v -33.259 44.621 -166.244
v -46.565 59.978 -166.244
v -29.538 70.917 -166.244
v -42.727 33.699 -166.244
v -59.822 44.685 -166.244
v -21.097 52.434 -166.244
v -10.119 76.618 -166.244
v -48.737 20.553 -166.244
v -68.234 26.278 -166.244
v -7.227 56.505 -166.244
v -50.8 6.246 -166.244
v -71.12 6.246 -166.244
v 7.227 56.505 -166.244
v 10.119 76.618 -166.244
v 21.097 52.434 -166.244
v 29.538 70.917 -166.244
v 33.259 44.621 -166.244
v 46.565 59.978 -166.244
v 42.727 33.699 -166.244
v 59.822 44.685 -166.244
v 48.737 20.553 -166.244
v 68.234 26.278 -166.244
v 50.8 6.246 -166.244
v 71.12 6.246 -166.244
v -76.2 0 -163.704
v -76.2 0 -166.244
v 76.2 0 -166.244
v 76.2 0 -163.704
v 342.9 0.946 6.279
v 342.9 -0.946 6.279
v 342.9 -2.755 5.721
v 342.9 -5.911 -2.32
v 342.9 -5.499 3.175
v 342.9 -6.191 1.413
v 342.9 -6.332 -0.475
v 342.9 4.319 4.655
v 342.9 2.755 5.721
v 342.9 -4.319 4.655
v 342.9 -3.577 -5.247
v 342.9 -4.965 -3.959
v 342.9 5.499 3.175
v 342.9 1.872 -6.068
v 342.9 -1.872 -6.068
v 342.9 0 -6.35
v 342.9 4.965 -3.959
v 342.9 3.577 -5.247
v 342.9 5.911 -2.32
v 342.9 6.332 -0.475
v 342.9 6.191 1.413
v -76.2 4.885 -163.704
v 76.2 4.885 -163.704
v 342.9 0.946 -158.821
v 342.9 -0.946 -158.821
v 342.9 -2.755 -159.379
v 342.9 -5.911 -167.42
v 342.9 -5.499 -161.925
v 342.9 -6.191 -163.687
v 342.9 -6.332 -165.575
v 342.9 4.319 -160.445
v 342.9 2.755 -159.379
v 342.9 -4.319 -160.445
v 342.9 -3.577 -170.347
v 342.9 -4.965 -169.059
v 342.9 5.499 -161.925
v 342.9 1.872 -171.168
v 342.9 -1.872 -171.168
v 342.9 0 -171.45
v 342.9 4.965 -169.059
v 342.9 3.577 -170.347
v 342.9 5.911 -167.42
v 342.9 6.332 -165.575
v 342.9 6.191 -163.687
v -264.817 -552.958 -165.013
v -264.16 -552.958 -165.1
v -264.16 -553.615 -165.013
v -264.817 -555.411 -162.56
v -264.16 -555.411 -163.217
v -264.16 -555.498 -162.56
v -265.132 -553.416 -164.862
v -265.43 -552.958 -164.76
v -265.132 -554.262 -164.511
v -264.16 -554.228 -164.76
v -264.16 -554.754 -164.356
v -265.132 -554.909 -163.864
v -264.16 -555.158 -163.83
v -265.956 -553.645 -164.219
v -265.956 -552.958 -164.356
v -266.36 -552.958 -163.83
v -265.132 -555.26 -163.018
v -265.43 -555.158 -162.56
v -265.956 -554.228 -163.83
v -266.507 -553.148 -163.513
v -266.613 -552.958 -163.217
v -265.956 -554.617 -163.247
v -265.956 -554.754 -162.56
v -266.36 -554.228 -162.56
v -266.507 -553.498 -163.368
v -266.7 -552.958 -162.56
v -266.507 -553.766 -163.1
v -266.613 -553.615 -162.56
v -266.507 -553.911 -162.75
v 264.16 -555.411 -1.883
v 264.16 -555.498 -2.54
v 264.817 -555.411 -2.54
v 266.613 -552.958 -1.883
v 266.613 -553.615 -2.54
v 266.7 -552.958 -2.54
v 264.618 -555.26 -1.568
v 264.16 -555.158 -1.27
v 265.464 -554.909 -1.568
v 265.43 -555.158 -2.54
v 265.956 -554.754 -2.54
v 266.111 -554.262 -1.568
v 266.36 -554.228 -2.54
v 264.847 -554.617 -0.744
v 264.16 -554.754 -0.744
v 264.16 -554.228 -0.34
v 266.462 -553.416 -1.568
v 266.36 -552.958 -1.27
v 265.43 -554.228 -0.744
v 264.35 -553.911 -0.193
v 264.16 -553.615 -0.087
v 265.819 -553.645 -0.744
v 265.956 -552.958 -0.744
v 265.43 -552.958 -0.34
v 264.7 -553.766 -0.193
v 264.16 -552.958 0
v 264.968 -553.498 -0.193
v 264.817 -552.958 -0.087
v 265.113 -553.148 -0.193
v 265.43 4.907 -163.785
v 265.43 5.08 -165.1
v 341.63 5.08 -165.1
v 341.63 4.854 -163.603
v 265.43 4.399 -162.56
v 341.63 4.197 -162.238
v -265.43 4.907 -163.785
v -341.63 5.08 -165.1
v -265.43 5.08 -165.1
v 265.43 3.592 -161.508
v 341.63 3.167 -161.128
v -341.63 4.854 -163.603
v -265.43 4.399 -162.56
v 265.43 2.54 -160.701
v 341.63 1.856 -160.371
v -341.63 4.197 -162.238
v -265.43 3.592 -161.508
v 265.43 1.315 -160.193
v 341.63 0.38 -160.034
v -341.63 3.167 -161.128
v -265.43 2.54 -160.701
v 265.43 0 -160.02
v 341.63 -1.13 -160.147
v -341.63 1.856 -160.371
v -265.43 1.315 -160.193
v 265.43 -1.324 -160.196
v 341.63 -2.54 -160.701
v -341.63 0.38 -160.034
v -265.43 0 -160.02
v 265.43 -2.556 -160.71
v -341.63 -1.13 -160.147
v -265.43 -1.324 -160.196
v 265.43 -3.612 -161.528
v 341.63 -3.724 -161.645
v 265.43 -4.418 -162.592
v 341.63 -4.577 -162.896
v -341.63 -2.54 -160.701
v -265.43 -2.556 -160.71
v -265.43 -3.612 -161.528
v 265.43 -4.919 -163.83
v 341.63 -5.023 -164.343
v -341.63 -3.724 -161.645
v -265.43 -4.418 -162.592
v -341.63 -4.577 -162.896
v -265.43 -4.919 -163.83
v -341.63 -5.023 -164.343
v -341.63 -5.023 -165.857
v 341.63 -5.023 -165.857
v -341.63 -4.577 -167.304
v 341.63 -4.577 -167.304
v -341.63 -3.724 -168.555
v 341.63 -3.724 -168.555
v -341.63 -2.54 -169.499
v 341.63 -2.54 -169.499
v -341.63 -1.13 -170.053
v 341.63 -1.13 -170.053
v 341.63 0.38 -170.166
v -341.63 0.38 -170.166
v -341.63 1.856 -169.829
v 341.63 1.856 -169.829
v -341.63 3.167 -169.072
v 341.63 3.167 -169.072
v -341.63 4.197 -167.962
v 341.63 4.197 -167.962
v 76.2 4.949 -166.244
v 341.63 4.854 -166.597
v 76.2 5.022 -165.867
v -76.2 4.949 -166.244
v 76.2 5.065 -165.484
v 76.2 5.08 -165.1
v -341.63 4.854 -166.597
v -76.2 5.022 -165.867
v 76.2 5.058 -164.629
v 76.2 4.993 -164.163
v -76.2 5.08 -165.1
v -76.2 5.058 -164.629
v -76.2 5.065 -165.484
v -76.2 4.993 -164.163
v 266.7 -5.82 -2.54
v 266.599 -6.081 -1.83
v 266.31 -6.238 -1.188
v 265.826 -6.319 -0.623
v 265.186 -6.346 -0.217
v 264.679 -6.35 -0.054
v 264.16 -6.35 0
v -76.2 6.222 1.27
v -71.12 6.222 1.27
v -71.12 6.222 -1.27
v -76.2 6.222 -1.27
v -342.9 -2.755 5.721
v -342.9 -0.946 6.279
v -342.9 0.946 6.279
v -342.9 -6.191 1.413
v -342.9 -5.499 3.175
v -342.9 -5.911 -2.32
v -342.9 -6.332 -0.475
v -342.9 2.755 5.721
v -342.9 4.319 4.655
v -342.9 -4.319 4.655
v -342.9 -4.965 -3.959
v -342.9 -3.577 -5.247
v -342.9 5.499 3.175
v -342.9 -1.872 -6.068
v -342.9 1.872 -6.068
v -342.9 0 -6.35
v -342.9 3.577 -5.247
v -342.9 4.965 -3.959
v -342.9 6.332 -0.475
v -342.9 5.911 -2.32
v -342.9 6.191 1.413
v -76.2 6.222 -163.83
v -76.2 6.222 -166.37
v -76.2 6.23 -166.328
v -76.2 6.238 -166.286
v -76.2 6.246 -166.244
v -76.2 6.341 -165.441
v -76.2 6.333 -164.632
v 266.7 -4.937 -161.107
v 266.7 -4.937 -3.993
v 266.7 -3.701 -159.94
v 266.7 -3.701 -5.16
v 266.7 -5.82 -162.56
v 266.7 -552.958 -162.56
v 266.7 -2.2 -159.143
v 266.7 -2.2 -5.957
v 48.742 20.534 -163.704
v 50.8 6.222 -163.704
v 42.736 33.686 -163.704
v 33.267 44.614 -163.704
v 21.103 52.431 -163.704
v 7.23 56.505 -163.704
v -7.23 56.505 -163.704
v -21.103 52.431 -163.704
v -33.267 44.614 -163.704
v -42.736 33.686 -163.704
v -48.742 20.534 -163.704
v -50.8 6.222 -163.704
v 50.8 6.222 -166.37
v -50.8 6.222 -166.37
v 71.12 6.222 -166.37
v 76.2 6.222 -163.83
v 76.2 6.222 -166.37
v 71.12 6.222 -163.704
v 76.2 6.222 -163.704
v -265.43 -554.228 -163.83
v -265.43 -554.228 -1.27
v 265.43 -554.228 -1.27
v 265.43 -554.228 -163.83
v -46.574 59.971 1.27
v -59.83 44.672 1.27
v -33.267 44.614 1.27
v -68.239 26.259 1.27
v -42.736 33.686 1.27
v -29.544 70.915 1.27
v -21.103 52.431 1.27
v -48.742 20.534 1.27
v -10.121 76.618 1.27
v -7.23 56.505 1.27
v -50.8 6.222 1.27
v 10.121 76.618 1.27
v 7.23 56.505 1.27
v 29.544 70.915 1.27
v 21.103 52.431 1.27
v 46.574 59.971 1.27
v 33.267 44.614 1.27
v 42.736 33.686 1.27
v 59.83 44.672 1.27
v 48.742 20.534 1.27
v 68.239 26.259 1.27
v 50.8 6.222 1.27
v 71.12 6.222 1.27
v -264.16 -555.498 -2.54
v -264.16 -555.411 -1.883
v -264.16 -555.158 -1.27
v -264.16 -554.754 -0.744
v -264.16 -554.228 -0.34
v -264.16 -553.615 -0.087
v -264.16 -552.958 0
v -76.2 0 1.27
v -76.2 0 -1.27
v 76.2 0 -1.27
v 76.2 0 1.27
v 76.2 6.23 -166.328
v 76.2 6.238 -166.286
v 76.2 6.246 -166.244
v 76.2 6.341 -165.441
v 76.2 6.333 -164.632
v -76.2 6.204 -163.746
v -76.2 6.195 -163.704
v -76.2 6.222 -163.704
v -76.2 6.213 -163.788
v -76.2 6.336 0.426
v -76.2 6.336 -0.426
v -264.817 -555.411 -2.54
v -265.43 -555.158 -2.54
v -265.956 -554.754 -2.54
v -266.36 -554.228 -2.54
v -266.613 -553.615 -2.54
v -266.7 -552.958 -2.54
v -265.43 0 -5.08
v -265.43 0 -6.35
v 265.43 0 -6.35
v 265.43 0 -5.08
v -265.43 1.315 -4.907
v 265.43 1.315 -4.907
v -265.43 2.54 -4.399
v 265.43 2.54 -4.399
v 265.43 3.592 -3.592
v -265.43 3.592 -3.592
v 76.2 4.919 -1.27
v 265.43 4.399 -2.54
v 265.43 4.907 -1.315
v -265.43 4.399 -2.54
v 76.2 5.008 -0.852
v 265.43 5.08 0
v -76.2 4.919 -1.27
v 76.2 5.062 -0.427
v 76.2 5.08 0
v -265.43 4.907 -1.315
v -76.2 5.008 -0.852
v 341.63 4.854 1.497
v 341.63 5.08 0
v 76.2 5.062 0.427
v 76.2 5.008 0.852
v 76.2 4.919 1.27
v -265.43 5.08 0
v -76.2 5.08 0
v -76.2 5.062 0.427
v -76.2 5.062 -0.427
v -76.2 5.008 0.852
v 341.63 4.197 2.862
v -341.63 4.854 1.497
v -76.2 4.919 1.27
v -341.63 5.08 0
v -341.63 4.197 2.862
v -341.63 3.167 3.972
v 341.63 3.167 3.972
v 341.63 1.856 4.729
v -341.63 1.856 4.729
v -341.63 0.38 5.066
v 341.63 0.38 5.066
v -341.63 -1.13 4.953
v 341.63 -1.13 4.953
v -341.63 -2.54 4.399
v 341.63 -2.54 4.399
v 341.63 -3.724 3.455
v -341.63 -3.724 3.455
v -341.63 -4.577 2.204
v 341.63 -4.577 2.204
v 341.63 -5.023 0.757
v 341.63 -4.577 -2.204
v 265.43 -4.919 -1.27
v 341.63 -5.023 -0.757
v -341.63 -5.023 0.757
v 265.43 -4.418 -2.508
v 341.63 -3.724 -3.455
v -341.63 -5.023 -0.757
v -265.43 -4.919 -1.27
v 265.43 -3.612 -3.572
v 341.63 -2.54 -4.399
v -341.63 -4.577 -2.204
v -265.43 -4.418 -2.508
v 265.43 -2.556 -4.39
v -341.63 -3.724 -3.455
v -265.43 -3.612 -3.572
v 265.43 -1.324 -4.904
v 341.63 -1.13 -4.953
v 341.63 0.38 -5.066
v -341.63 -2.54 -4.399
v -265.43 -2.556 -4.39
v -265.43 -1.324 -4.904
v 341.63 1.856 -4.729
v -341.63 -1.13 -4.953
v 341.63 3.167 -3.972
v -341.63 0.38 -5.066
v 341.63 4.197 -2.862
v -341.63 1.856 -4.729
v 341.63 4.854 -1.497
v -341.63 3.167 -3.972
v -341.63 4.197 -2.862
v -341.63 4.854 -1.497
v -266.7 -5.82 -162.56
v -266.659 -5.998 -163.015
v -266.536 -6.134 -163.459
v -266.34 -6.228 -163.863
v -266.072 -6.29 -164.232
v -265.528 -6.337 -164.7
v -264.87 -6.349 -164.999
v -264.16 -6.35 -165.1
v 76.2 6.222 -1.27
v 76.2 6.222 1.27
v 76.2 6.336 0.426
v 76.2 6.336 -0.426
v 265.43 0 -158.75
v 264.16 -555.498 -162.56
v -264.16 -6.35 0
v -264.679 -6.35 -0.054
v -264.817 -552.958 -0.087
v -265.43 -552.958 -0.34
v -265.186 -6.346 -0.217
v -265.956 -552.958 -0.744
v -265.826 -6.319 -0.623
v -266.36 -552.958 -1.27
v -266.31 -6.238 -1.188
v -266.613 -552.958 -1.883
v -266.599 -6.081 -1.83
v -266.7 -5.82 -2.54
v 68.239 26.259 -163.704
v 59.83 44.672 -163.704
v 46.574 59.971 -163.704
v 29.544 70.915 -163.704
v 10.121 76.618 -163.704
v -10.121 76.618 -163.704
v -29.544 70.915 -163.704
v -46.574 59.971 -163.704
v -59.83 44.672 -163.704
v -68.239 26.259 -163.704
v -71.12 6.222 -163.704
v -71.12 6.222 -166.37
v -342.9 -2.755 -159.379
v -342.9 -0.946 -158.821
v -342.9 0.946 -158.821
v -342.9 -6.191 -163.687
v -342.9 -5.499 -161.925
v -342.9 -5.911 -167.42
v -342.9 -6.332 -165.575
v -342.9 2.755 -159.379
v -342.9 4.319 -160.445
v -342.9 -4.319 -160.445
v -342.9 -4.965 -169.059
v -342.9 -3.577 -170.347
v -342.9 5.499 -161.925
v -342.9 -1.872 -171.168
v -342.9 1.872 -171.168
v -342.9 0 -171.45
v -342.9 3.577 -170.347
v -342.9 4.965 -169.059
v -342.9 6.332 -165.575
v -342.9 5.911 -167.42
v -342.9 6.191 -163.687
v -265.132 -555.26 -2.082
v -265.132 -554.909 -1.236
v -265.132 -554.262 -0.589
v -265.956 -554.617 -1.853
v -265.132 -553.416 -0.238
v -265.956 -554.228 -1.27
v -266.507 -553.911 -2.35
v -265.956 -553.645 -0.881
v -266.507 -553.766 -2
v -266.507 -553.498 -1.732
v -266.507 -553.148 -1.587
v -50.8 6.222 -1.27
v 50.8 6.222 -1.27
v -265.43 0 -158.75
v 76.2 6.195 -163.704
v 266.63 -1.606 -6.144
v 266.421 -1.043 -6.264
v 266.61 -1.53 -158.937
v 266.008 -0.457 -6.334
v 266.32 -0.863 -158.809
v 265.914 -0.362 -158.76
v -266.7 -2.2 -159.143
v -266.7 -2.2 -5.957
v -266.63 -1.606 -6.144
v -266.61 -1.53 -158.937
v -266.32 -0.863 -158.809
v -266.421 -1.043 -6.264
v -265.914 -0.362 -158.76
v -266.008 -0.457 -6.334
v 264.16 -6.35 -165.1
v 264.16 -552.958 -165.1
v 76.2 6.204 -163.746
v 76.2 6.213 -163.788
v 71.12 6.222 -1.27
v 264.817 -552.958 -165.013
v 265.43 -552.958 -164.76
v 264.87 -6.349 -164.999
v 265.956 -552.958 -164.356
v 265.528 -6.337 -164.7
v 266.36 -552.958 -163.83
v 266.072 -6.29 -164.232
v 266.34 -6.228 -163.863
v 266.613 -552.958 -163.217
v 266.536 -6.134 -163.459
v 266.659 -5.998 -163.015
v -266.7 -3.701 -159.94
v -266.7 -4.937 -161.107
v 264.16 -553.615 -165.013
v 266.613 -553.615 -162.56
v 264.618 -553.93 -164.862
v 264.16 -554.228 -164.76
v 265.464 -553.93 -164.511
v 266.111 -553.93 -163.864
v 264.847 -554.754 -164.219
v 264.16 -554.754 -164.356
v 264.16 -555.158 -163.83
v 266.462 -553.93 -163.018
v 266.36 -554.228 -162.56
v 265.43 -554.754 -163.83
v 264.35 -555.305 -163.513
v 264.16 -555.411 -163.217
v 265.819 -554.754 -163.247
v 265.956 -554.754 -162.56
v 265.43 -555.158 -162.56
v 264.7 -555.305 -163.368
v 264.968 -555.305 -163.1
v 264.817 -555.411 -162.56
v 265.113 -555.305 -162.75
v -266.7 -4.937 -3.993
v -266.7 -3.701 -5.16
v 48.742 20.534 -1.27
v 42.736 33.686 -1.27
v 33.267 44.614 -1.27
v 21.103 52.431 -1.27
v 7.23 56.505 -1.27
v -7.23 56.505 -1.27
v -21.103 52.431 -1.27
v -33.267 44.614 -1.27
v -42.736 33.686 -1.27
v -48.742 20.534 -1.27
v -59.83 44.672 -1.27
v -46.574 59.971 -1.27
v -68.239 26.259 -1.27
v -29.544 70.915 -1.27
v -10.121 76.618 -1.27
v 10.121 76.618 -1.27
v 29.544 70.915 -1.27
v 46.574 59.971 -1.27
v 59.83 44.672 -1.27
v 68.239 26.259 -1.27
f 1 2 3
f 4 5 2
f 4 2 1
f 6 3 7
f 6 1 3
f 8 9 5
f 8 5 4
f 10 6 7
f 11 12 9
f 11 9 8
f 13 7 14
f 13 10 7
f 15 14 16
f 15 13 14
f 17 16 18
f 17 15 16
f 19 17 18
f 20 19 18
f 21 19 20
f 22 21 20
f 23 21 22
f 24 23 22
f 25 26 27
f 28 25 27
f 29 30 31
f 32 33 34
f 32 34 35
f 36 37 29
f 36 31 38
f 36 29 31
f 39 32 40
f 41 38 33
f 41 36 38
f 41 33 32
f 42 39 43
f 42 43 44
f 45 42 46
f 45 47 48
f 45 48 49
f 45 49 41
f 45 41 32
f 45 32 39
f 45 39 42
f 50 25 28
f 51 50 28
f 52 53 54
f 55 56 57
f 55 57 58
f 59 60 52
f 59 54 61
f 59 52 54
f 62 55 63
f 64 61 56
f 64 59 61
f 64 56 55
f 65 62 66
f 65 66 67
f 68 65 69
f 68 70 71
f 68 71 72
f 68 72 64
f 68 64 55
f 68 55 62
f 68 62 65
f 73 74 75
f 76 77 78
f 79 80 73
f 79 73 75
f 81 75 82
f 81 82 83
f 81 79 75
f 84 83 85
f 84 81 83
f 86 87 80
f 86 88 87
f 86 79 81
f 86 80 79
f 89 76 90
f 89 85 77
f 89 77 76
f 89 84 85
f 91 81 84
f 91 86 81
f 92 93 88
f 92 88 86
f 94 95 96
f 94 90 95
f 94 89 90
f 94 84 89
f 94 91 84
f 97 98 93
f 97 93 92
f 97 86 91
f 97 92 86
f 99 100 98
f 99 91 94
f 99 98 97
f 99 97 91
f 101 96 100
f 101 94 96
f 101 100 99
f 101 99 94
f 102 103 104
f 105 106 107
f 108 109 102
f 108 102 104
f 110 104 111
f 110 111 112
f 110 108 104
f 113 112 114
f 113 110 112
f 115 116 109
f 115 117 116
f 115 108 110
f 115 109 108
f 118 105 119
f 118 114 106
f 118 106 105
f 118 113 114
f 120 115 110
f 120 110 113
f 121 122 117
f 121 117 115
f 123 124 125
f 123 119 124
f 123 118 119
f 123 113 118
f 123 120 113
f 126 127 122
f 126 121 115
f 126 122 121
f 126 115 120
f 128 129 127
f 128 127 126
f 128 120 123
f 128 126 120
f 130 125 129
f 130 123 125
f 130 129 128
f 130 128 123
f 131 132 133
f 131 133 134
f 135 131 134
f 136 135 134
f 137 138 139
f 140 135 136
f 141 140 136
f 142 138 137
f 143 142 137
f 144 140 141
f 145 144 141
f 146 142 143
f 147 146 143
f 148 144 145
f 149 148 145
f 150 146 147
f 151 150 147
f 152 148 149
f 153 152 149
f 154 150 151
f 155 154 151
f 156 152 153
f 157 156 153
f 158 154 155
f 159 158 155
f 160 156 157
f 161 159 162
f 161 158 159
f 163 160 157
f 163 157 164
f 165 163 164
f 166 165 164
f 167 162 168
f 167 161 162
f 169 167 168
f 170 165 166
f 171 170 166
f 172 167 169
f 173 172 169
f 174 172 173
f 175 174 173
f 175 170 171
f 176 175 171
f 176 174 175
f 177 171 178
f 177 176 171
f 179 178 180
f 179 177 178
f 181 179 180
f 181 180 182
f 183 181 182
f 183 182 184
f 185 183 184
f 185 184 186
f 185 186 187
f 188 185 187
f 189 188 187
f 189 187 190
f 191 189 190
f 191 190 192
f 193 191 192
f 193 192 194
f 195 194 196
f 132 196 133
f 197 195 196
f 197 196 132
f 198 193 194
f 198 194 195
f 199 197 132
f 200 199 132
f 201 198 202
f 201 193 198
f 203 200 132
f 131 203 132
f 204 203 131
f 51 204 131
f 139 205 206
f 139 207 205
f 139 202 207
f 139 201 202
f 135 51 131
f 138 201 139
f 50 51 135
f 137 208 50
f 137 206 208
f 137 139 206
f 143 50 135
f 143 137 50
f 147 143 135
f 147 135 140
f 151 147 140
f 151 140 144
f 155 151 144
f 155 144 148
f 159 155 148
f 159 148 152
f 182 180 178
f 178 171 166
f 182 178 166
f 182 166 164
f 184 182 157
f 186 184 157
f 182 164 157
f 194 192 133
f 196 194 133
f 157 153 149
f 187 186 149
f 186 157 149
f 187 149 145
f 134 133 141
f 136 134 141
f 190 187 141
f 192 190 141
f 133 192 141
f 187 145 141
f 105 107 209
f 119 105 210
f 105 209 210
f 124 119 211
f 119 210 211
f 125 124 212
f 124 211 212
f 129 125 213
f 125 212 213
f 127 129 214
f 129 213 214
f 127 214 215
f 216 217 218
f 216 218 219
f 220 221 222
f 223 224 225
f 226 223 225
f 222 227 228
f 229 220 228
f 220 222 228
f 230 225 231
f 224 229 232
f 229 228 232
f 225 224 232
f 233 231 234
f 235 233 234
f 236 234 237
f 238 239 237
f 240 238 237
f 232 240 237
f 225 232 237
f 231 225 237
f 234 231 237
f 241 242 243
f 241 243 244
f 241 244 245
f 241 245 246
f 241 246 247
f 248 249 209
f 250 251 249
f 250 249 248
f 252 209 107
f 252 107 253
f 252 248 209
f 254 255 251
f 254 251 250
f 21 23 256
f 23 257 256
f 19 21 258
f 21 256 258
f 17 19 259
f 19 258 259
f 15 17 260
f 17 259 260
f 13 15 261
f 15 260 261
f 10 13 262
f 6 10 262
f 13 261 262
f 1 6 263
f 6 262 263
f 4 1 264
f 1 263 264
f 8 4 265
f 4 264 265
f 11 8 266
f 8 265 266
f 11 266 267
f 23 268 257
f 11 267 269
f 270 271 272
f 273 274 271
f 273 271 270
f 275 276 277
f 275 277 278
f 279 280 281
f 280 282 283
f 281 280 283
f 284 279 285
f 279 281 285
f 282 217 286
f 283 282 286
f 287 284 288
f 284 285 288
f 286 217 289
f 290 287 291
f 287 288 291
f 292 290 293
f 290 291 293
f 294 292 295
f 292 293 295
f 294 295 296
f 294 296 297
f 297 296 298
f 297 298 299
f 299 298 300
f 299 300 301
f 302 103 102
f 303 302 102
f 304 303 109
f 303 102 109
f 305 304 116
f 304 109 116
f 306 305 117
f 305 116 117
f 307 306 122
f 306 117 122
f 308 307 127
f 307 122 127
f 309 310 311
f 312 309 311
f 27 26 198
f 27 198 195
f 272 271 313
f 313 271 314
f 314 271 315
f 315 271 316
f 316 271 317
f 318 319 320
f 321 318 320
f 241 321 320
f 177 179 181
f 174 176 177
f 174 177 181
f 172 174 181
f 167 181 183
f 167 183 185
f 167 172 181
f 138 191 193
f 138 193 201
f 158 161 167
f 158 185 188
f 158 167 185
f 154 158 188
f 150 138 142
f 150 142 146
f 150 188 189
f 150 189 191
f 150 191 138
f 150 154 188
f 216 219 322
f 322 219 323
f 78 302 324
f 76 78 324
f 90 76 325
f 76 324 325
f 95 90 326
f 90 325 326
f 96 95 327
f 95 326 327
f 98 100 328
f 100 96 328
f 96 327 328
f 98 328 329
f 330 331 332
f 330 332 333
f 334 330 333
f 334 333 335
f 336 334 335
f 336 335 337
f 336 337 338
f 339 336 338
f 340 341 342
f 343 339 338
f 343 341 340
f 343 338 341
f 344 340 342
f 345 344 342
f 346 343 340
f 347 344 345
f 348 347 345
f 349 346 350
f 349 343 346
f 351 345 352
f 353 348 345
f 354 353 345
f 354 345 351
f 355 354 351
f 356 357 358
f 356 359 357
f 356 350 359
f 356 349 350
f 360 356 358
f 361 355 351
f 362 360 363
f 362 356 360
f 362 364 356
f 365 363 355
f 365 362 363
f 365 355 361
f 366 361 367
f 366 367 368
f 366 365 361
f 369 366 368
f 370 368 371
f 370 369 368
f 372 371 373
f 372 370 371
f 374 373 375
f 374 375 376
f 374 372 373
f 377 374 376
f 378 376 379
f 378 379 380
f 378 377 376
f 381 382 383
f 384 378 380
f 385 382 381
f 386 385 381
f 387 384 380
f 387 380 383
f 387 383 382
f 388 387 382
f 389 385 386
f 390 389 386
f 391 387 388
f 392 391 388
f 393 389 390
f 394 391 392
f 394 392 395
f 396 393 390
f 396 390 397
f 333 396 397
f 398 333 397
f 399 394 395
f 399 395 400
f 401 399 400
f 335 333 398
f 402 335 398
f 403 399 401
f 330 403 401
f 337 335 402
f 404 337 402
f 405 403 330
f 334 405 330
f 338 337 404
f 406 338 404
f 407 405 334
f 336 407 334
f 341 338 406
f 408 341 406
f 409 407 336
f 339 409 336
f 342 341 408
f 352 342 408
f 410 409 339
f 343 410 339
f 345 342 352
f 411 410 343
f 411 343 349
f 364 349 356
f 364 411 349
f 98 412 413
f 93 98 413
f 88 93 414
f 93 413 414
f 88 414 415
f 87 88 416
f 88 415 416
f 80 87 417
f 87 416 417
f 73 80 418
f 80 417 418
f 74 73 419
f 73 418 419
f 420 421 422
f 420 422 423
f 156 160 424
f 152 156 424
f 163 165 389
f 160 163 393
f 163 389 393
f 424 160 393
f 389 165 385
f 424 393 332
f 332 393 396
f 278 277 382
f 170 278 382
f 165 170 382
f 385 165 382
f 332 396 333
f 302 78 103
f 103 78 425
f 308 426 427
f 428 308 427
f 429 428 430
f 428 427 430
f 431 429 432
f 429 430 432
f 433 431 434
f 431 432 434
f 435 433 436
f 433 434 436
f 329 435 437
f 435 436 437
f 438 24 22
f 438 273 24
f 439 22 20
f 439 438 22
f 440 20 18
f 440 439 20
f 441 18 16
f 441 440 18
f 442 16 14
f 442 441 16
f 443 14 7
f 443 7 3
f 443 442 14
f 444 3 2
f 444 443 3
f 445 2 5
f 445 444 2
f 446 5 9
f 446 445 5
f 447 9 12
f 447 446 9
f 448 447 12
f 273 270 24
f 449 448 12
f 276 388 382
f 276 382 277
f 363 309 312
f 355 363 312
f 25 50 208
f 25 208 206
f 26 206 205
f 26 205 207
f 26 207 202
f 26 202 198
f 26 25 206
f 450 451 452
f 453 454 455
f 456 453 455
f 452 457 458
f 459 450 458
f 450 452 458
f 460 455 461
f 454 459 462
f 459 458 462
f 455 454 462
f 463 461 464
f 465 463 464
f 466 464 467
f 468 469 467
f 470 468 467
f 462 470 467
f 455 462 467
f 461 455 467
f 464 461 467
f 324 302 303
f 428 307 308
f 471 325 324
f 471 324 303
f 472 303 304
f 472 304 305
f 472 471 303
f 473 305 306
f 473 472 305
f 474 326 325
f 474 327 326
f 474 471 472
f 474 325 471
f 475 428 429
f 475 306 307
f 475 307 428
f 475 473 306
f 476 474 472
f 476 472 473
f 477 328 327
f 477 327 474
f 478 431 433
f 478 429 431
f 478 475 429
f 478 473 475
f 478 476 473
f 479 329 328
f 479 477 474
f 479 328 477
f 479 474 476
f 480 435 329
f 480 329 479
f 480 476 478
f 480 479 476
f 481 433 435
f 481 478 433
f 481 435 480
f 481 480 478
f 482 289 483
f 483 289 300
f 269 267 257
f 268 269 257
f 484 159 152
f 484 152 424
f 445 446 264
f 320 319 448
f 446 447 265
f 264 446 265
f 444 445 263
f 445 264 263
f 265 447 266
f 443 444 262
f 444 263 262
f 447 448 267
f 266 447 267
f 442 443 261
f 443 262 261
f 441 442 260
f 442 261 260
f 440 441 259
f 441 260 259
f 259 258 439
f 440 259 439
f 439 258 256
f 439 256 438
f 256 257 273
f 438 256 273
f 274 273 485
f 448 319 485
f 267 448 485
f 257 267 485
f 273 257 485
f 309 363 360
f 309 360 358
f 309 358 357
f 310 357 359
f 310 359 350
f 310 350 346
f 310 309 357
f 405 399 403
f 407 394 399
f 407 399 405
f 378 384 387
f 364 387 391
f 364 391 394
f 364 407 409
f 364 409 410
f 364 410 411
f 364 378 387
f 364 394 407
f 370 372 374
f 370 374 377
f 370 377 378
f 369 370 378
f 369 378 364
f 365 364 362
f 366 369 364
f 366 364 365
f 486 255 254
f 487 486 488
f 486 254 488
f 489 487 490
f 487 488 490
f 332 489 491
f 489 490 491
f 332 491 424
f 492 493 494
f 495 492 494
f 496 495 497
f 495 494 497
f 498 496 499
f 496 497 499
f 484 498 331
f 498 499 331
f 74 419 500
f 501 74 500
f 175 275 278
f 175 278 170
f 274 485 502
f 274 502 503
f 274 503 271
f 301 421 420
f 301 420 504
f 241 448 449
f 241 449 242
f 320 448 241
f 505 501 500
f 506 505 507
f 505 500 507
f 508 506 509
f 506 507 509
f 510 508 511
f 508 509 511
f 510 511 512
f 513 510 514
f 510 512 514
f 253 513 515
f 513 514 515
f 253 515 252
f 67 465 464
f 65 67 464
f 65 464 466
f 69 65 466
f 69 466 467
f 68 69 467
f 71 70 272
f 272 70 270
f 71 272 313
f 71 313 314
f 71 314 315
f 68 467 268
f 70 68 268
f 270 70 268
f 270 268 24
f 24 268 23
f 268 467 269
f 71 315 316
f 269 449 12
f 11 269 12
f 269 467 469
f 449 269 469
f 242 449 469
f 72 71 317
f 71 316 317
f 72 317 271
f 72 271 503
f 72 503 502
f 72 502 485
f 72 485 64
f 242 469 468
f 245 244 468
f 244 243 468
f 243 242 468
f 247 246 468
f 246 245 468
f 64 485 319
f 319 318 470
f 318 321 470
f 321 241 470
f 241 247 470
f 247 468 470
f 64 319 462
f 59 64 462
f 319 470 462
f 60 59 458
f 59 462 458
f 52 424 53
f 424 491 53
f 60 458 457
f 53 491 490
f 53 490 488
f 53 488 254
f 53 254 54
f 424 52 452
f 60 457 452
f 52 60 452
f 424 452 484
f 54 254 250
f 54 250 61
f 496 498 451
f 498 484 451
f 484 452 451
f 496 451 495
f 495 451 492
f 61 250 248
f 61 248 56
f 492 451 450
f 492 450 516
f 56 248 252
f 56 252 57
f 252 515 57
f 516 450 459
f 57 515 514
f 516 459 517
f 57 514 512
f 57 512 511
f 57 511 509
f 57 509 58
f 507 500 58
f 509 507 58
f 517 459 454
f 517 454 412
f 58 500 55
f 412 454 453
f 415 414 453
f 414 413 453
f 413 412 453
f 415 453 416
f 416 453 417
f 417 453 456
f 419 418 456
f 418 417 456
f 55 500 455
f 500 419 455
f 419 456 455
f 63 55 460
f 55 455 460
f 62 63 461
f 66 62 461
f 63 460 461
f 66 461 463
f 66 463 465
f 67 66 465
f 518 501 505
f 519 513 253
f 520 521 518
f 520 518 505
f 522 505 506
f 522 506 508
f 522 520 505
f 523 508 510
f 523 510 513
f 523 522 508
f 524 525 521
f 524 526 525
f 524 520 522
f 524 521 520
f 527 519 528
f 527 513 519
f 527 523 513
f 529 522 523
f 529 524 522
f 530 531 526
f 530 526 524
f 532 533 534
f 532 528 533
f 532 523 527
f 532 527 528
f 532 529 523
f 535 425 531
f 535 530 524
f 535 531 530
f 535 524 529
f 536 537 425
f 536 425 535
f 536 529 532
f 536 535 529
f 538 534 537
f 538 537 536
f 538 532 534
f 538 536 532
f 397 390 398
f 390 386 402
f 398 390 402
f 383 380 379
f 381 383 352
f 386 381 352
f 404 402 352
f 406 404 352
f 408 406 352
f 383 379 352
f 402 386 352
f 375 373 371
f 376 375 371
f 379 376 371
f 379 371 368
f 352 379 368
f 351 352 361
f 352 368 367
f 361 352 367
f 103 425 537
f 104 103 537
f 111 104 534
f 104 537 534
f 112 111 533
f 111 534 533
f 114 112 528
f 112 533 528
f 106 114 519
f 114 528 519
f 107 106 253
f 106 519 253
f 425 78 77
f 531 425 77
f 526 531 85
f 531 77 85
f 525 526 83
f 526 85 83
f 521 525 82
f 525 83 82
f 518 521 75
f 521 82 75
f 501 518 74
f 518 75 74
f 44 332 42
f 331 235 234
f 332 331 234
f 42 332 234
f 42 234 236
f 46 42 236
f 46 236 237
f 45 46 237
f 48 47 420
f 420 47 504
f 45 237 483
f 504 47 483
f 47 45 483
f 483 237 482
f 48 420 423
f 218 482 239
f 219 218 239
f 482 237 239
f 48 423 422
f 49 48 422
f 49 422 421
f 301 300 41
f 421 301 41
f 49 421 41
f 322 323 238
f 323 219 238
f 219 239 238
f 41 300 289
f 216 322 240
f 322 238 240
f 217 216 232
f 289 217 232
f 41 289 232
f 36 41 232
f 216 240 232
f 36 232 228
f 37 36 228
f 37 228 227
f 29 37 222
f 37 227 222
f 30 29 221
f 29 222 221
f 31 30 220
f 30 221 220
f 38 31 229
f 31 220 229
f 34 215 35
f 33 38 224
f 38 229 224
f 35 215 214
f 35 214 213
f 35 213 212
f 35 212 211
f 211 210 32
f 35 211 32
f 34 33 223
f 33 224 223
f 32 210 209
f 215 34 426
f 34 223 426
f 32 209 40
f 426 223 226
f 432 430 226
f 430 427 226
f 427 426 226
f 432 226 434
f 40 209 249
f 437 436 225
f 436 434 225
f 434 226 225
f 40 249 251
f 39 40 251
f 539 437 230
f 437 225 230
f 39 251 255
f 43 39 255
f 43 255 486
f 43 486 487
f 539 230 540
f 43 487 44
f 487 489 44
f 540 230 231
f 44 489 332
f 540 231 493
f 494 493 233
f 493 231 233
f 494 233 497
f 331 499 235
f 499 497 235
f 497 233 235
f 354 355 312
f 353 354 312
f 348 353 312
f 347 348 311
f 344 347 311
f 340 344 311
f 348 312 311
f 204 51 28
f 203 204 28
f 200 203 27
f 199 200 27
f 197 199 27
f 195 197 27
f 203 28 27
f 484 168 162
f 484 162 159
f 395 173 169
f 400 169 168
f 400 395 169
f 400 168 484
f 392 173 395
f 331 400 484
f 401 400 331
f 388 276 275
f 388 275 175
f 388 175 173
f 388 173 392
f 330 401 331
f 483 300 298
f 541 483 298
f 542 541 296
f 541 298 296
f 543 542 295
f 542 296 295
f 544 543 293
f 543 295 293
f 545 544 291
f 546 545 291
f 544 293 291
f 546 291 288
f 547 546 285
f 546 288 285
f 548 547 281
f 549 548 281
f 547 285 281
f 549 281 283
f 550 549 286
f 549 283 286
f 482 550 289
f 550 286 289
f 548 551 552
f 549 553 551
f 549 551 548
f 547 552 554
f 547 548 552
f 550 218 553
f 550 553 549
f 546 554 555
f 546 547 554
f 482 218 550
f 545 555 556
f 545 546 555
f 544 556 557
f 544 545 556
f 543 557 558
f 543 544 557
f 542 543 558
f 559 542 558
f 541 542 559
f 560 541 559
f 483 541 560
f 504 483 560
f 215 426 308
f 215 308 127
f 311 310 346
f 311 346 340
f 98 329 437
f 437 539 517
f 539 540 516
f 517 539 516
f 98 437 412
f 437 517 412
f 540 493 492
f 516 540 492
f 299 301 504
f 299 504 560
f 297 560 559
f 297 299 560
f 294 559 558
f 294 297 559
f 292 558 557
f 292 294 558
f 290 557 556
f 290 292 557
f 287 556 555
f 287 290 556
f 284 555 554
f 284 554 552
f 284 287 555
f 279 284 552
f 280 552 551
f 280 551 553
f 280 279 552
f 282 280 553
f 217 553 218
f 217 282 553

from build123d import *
from build123d.topology import SkipClean

# Parameters (mm, degrees)
SALIENTE_EXTRUIR3_DEPTH        = 342.9
SALIENTE_EXTRUIR3_DEPTH_BACK   = 342.9
CROQUIS3_R                     = 6.35
SALIENTE_EXTRUIR3_2_DEPTH      = 342.9
SALIENTE_EXTRUIR3_2_DEPTH_BACK = 342.9
CROQUIS4_W                     = 533.4
CROQUIS4_H                     = 165.1
SALIENTE_EXTRUIR4_DEPTH        = 555.498
VACIADO3_START                 = -265.43
VACIADO3_DEPTH                 = 530.86
VACIADO3_START_2               = -341.63
VACIADO3_2_OUTLINE_R           = 5.08
VACIADO3_2_DEPTH               = 683.26
REDONDEO5_R                    = 2.54
CROQUIS5_W                     = 152.4
CROQUIS5_H                     = 2.54
SALIENTE_EXTRUIR5_DEPTH        = 101.6
CORTAR_EXTRUIR2_DEPTH          = 676.270787465
CORTAR_EXTRUIR8_DEPTH          = 676.270787542


# Read off the part's stored shape, not the designer's step: Vaciado3
with BuildPart() as part:
    # Croquis3 → Saliente-Extruir3 (new, two sides: drawn at the far end of the back side and taken through both)
    with BuildSketch(Plane(origin=(0, 0, 0), x_dir=(0, 0, -1), z_dir=(1, 0, 0)).offset(-SALIENTE_EXTRUIR3_DEPTH_BACK)):
        Circle(CROQUIS3_R)
    extrude(amount=SALIENTE_EXTRUIR3_DEPTH + SALIENTE_EXTRUIR3_DEPTH_BACK)



with BuildPart() as body_2:
    # Croquis3 → Saliente-Extruir3 2 (new, two sides: drawn at the far end of the back side and taken through both)
    with BuildSketch(Plane(origin=(0, 0, 0), x_dir=(0, 0, -1), z_dir=(1, 0, 0)).offset(-SALIENTE_EXTRUIR3_2_DEPTH_BACK)):
        with Locations((165.1, 0)):
            Circle(CROQUIS3_R)
    extrude(amount=SALIENTE_EXTRUIR3_2_DEPTH + SALIENTE_EXTRUIR3_2_DEPTH_BACK)


with BuildPart() as part_1:
    add(part.part)

    add(body_2.part)  # Saliente-Extruir4 merges body 2
    # Croquis4 → Saliente-Extruir4 (add)
    with BuildSketch(Plane(origin=(0, 0, 0), x_dir=(1, 0, 0), z_dir=(0, 1, 0))):
        with Locations((0, 82.55)):
            Rectangle(CROQUIS4_W, CROQUIS4_H)
    extrude(amount=-SALIENTE_EXTRUIR4_DEPTH)

    # Vaciado3 outline → Vaciado3 (cut)
    with BuildSketch(Plane.YZ.offset(VACIADO3_START)):
        with BuildLine():
            Line((-554.228, -163.83), (-4.91868885, -163.83))
            ThreePointArc((-4.91868885, -163.83), (3.110851973, -169.116092628), (0, -160.02))
            Line((0, -160.02), (0, -5.08))
            ThreePointArc((0, -5.08), (3.110851973, 4.016092628), (-4.91868885, -1.27))
            Line((-4.91868885, -1.27), (-554.228, -1.27))
            Line((-554.228, -1.27), (-554.228, -163.83))
        make_face()
    extrude(amount=VACIADO3_DEPTH, mode=Mode.SUBTRACT)

    # Vaciado3 2 outline → Vaciado3 2 (cut)
    with BuildSketch(Plane.YZ.offset(VACIADO3_START_2)):
        with Locations((0, -165.1)):
            Circle(VACIADO3_2_OUTLINE_R)
        Circle(VACIADO3_2_OUTLINE_R)
    extrude(amount=VACIADO3_2_DEPTH, mode=Mode.SUBTRACT)

    # Redondeo5
    # the kernel refuses this fillet: 2.54 mm, written as the material it takes off along each edge
    with BuildSketch(Plane(origin=(-264.16, -552.958, -2.54), x_dir=(0, 0, 1), z_dir=(-1, 0, 0))) as redondeo5_piece_1_section:
        Polygon((0, 0), (REDONDEO5_R * 1.02, 0), (REDONDEO5_R * 1.02, -REDONDEO5_R * 1.02), (0, -REDONDEO5_R * 1.02), align=None)
    redondeo5_piece_1 = extrude(amount=REDONDEO5_R * 1.02, mode=Mode.PRIVATE)
    redondeo5_piece_1 = redondeo5_piece_1 - Plane(origin=(-264.16, -552.958, -2.54), x_dir=(0, 0.7071067811865475, -0.7071067811865475), z_dir=(-1, 0, 0)) * Sphere(REDONDEO5_R, mode=Mode.PRIVATE)
    add(redondeo5_piece_1, mode=Mode.SUBTRACT)
    with BuildSketch(Plane(origin=(-264.16, -552.958, -162.56), x_dir=(0, -1, 0), z_dir=(-1, 0, 0))) as redondeo5_piece_2_section:
        Polygon((0, 0), (REDONDEO5_R * 1.02, 0), (REDONDEO5_R * 1.02, -REDONDEO5_R * 1.02), (0, -REDONDEO5_R * 1.02), align=None)
    redondeo5_piece_2 = extrude(amount=REDONDEO5_R * 1.02, mode=Mode.PRIVATE)
    redondeo5_piece_2 = redondeo5_piece_2 - Plane(origin=(-264.16, -552.958, -162.56), x_dir=(0, 0.7071067811865475, 0.7071067811865475), z_dir=(-1, 0, 0)) * Sphere(REDONDEO5_R, mode=Mode.PRIVATE)
    add(redondeo5_piece_2, mode=Mode.SUBTRACT)
    with BuildSketch(Plane(origin=(264.16, -552.958, -2.54), x_dir=(1, 0, 0), z_dir=(0, 0, 1))) as redondeo5_piece_3_section:
        Polygon((0, 0), (REDONDEO5_R * 1.02, 0), (REDONDEO5_R * 1.02, -REDONDEO5_R * 1.02), (0, -REDONDEO5_R * 1.02), align=None)
    redondeo5_piece_3 = extrude(amount=REDONDEO5_R * 1.02, mode=Mode.PRIVATE)
    redondeo5_piece_3 = redondeo5_piece_3 - Plane(origin=(264.16, -552.958, -2.54), x_dir=(-0.7071067811865475, 0.7071067811865475, 0), z_dir=(0, 0, 1)) * Sphere(REDONDEO5_R, mode=Mode.PRIVATE)
    add(redondeo5_piece_3, mode=Mode.SUBTRACT)
    with BuildSketch(Plane(origin=(264.16, -552.958, -162.56), x_dir=(1, 0, 0), z_dir=(0, -1, 0))) as redondeo5_piece_4_section:
        Polygon((0, 0), (REDONDEO5_R * 1.02, 0), (REDONDEO5_R * 1.02, -REDONDEO5_R * 1.02), (0, -REDONDEO5_R * 1.02), align=None)
    redondeo5_piece_4 = extrude(amount=REDONDEO5_R * 1.02, mode=Mode.PRIVATE)
    redondeo5_piece_4 = redondeo5_piece_4 - Plane(origin=(264.16, -552.958, -162.56), x_dir=(-0.7071067811865474, 0, 0.7071067811865477), z_dir=(0, -1, 0)) * Sphere(REDONDEO5_R, mode=Mode.PRIVATE)
    add(redondeo5_piece_4, mode=Mode.SUBTRACT)
    with BuildSketch(Plane(origin=(266.7, 0, -164.249261314), x_dir=(0, -1, 0), z_dir=(0, 0, 1))) as redondeo5_piece_5_section:
        with BuildLine():
            CenterArc((2.199704526, -2.54), REDONDEO5_R, 90, 60)
            Line((0, -1.27), (0, 0))
            Line((0, 0), (2.199704526, 0))
        make_face()
    redondeo5_piece_5 = extrude(amount=163.398522628, mode=Mode.PRIVATE)
    redondeo5_piece_5 = redondeo5_piece_5 - Plane(origin=(266.364103935, 0, 0), x_dir=(0, 0, -1), z_dir=(-1, 0, 0)) * Cylinder(6.35, 336, mode=Mode.PRIVATE)
    redondeo5_piece_5 = redondeo5_piece_5 - Plane(origin=(266.364103935, 0, -165.1), x_dir=(0, 0, -1), z_dir=(-1, 0, 0)) * Cylinder(6.35, 336, mode=Mode.PRIVATE)
    add(redondeo5_piece_5, mode=Mode.SUBTRACT)
    with BuildSketch(Plane(origin=(-266.7, 0, -0.850738686), x_dir=(1, 0, 0), z_dir=(0, 0, -1))) as redondeo5_piece_6_section:
        with BuildLine():
            CenterArc((2.54, 2.199704526), REDONDEO5_R, 180, 60)
            Line((0, 2.199704526), (0, 0))
            Line((0, 0), (1.27, 0))
        make_face()
    redondeo5_piece_6 = extrude(amount=163.398522628, mode=Mode.PRIVATE)
    redondeo5_piece_6 = redondeo5_piece_6 - Plane(origin=(-266.364103935, 0, 0), x_dir=(0, 0, -1), z_dir=(-1, 0, 0)) * Cylinder(6.35, 336, mode=Mode.PRIVATE)
    redondeo5_piece_6 = redondeo5_piece_6 - Plane(origin=(-266.364103935, 0, -165.1), x_dir=(0, 0, -1), z_dir=(-1, 0, 0)) * Cylinder(6.35, 336, mode=Mode.PRIVATE)
    add(redondeo5_piece_6, mode=Mode.SUBTRACT)
    with BuildSketch(Plane(origin=(-266.7, 0, 0), x_dir=(1, 0, 0), z_dir=(0, -1, 0))) as redondeo5_piece_7_section:
        with BuildLine():
            CenterArc((REDONDEO5_R, -REDONDEO5_R), REDONDEO5_R, 90, 90)
            Line((0, -REDONDEO5_R), (0, 0))
            Line((0, 0), (REDONDEO5_R, 0))
        make_face()
    redondeo5_piece_7 = extrude(amount=552.958, mode=Mode.PRIVATE)
    redondeo5_piece_7 = redondeo5_piece_7 - Plane(origin=(-266.132673367, 0, 0), x_dir=(0, 0, -1), z_dir=(-1, 0, 0)) * Cylinder(6.35, 1117, mode=Mode.PRIVATE)
    add(redondeo5_piece_7, mode=Mode.SUBTRACT)
    with BuildSketch(Plane(origin=(-266.7, -555.498, -2.54), x_dir=(0, 1, 0), z_dir=(0, 0, -1)), Plane(origin=(266.7, -555.498, -162.56), x_dir=(0, 1, 0), z_dir=(0, 0, 1))) as redondeo5_piece_8:
        with BuildLine():
            CenterArc((REDONDEO5_R, REDONDEO5_R), REDONDEO5_R, 180, 90)
            Line((0, REDONDEO5_R), (0, 0))
            Line((0, 0), (REDONDEO5_R, 0))
        make_face()
    extrude(amount=160.02, mode=Mode.SUBTRACT)
    with BuildSketch(Plane(origin=(-266.7, 0, -165.1), x_dir=(0, 0, 1), z_dir=(0, -1, 0))) as redondeo5_piece_9_section:
        with BuildLine():
            CenterArc((REDONDEO5_R, -REDONDEO5_R), REDONDEO5_R, 90, 90)
            Line((0, -REDONDEO5_R), (0, 0))
            Line((0, 0), (REDONDEO5_R, 0))
        make_face()
    redondeo5_piece_9 = extrude(amount=552.958, mode=Mode.PRIVATE)
    redondeo5_piece_9 = redondeo5_piece_9 - Plane(origin=(-266.132672665, 0, -165.1), x_dir=(0, 0, -1), z_dir=(-1, 0, 0)) * Cylinder(6.35, 1117, mode=Mode.PRIVATE)
    add(redondeo5_piece_9, mode=Mode.SUBTRACT)
    with BuildSketch(Plane(origin=(266.7, 0, 0), x_dir=(-1, 0, 0), z_dir=(0, -1, 0))) as redondeo5_piece_10_section:
        with BuildLine():
            CenterArc((REDONDEO5_R, REDONDEO5_R), REDONDEO5_R, 180, 90)
            Line((0, REDONDEO5_R), (0, 0))
            Line((0, 0), (REDONDEO5_R, 0))
        make_face()
    redondeo5_piece_10 = extrude(amount=552.958, mode=Mode.PRIVATE)
    redondeo5_piece_10 = redondeo5_piece_10 - Plane(origin=(266.132673367, 0, 0), x_dir=(0, 0, -1), z_dir=(-1, 0, 0)) * Cylinder(6.35, 1117, mode=Mode.PRIVATE)
    add(redondeo5_piece_10, mode=Mode.SUBTRACT)
    with BuildSketch(Plane(origin=(264.16, -555.498, 0), x_dir=(0, 1, 0), z_dir=(-1, 0, 0))) as redondeo5_piece_11:
        with BuildLine():
            CenterArc((REDONDEO5_R, REDONDEO5_R), REDONDEO5_R, 180, 90)
            Line((0, REDONDEO5_R), (0, 0))
            Line((0, 0), (REDONDEO5_R, 0))
        make_face()
    extrude(amount=528.32, mode=Mode.SUBTRACT)
    with BuildSketch(Plane(origin=(-264.16, -555.498, -165.1), x_dir=(0, 0, 1), z_dir=(1, 0, 0))) as redondeo5_piece_12:
        with BuildLine():
            CenterArc((REDONDEO5_R, -REDONDEO5_R), REDONDEO5_R, 90, 90)
            Line((0, -REDONDEO5_R), (0, 0))
            Line((0, 0), (REDONDEO5_R, 0))
        make_face()
    extrude(amount=528.32, mode=Mode.SUBTRACT)
    with BuildSketch(Plane(origin=(266.7, 0, -165.1), x_dir=(0, 0, 1), z_dir=(0, -1, 0))) as redondeo5_piece_13_section:
        with BuildLine():
            CenterArc((REDONDEO5_R, REDONDEO5_R), REDONDEO5_R, 180, 90)
            Line((0, REDONDEO5_R), (0, 0))
            Line((0, 0), (REDONDEO5_R, 0))
        make_face()
    redondeo5_piece_13 = extrude(amount=552.958, mode=Mode.PRIVATE)
    redondeo5_piece_13 = redondeo5_piece_13 - Plane(origin=(266.132672665, 0, -165.1), x_dir=(0, 0, -1), z_dir=(-1, 0, 0)) * Cylinder(6.35, 1117, mode=Mode.PRIVATE)
    add(redondeo5_piece_13, mode=Mode.SUBTRACT)

    # Croquis5 → Saliente-Extruir5 (add)
    with SkipClean():  # the faces are left unmerged after this step: merging them gives an invalid solid
        with BuildSketch(Plane(origin=(0, 0, 0), x_dir=(1, 0, 0), z_dir=(0, 1, 0))):
            with Locations((0, 164.974335694)):
                Rectangle(CROQUIS5_W, CROQUIS5_H)
            Rectangle(CROQUIS5_W, CROQUIS5_H)
        extrude(amount=SALIENTE_EXTRUIR5_DEPTH)

    # Croquis6 → Cortar-Extruir2 (cut, through all)
    with SkipClean():  # the faces are left unmerged after this step: merging them gives an invalid solid
        with BuildSketch(Plane.XY.offset(1.27)):
            with BuildLine():
                Line((-50.8, 6.221703947), (50.8, 6.221703947))
                ThreePointArc((50.8, 6.221703947), (0, 57.021703947), (-50.8, 6.221703947))
            make_face()
        extrude(amount=-CORTAR_EXTRUIR2_DEPTH, mode=Mode.SUBTRACT)

    # Croquis7 → Cortar-Extruir8 (cut, through all)
    with SkipClean():  # the faces are left unmerged after this step: merging them gives an invalid solid
        with BuildSketch(Plane.XY.offset(1.27)):
            with BuildLine():
                Line((-71.12, 6.221703947), (-76.2, 6.221703947))
                Line((-76.2, 6.221703947), (-76.2, 101.6))
                Line((-76.2, 101.6), (76.2, 101.6))
                Line((76.2, 101.6), (76.2, 6.221703947))
                Line((76.2, 6.221703947), (71.12, 6.221703947))
                ThreePointArc((71.12, 6.221703947), (0, 77.341703947), (-71.12, 6.221703947))
            make_face()
        extrude(amount=-CORTAR_EXTRUIR8_DEPTH, mode=Mode.SUBTRACT)


solid = part_1.part
